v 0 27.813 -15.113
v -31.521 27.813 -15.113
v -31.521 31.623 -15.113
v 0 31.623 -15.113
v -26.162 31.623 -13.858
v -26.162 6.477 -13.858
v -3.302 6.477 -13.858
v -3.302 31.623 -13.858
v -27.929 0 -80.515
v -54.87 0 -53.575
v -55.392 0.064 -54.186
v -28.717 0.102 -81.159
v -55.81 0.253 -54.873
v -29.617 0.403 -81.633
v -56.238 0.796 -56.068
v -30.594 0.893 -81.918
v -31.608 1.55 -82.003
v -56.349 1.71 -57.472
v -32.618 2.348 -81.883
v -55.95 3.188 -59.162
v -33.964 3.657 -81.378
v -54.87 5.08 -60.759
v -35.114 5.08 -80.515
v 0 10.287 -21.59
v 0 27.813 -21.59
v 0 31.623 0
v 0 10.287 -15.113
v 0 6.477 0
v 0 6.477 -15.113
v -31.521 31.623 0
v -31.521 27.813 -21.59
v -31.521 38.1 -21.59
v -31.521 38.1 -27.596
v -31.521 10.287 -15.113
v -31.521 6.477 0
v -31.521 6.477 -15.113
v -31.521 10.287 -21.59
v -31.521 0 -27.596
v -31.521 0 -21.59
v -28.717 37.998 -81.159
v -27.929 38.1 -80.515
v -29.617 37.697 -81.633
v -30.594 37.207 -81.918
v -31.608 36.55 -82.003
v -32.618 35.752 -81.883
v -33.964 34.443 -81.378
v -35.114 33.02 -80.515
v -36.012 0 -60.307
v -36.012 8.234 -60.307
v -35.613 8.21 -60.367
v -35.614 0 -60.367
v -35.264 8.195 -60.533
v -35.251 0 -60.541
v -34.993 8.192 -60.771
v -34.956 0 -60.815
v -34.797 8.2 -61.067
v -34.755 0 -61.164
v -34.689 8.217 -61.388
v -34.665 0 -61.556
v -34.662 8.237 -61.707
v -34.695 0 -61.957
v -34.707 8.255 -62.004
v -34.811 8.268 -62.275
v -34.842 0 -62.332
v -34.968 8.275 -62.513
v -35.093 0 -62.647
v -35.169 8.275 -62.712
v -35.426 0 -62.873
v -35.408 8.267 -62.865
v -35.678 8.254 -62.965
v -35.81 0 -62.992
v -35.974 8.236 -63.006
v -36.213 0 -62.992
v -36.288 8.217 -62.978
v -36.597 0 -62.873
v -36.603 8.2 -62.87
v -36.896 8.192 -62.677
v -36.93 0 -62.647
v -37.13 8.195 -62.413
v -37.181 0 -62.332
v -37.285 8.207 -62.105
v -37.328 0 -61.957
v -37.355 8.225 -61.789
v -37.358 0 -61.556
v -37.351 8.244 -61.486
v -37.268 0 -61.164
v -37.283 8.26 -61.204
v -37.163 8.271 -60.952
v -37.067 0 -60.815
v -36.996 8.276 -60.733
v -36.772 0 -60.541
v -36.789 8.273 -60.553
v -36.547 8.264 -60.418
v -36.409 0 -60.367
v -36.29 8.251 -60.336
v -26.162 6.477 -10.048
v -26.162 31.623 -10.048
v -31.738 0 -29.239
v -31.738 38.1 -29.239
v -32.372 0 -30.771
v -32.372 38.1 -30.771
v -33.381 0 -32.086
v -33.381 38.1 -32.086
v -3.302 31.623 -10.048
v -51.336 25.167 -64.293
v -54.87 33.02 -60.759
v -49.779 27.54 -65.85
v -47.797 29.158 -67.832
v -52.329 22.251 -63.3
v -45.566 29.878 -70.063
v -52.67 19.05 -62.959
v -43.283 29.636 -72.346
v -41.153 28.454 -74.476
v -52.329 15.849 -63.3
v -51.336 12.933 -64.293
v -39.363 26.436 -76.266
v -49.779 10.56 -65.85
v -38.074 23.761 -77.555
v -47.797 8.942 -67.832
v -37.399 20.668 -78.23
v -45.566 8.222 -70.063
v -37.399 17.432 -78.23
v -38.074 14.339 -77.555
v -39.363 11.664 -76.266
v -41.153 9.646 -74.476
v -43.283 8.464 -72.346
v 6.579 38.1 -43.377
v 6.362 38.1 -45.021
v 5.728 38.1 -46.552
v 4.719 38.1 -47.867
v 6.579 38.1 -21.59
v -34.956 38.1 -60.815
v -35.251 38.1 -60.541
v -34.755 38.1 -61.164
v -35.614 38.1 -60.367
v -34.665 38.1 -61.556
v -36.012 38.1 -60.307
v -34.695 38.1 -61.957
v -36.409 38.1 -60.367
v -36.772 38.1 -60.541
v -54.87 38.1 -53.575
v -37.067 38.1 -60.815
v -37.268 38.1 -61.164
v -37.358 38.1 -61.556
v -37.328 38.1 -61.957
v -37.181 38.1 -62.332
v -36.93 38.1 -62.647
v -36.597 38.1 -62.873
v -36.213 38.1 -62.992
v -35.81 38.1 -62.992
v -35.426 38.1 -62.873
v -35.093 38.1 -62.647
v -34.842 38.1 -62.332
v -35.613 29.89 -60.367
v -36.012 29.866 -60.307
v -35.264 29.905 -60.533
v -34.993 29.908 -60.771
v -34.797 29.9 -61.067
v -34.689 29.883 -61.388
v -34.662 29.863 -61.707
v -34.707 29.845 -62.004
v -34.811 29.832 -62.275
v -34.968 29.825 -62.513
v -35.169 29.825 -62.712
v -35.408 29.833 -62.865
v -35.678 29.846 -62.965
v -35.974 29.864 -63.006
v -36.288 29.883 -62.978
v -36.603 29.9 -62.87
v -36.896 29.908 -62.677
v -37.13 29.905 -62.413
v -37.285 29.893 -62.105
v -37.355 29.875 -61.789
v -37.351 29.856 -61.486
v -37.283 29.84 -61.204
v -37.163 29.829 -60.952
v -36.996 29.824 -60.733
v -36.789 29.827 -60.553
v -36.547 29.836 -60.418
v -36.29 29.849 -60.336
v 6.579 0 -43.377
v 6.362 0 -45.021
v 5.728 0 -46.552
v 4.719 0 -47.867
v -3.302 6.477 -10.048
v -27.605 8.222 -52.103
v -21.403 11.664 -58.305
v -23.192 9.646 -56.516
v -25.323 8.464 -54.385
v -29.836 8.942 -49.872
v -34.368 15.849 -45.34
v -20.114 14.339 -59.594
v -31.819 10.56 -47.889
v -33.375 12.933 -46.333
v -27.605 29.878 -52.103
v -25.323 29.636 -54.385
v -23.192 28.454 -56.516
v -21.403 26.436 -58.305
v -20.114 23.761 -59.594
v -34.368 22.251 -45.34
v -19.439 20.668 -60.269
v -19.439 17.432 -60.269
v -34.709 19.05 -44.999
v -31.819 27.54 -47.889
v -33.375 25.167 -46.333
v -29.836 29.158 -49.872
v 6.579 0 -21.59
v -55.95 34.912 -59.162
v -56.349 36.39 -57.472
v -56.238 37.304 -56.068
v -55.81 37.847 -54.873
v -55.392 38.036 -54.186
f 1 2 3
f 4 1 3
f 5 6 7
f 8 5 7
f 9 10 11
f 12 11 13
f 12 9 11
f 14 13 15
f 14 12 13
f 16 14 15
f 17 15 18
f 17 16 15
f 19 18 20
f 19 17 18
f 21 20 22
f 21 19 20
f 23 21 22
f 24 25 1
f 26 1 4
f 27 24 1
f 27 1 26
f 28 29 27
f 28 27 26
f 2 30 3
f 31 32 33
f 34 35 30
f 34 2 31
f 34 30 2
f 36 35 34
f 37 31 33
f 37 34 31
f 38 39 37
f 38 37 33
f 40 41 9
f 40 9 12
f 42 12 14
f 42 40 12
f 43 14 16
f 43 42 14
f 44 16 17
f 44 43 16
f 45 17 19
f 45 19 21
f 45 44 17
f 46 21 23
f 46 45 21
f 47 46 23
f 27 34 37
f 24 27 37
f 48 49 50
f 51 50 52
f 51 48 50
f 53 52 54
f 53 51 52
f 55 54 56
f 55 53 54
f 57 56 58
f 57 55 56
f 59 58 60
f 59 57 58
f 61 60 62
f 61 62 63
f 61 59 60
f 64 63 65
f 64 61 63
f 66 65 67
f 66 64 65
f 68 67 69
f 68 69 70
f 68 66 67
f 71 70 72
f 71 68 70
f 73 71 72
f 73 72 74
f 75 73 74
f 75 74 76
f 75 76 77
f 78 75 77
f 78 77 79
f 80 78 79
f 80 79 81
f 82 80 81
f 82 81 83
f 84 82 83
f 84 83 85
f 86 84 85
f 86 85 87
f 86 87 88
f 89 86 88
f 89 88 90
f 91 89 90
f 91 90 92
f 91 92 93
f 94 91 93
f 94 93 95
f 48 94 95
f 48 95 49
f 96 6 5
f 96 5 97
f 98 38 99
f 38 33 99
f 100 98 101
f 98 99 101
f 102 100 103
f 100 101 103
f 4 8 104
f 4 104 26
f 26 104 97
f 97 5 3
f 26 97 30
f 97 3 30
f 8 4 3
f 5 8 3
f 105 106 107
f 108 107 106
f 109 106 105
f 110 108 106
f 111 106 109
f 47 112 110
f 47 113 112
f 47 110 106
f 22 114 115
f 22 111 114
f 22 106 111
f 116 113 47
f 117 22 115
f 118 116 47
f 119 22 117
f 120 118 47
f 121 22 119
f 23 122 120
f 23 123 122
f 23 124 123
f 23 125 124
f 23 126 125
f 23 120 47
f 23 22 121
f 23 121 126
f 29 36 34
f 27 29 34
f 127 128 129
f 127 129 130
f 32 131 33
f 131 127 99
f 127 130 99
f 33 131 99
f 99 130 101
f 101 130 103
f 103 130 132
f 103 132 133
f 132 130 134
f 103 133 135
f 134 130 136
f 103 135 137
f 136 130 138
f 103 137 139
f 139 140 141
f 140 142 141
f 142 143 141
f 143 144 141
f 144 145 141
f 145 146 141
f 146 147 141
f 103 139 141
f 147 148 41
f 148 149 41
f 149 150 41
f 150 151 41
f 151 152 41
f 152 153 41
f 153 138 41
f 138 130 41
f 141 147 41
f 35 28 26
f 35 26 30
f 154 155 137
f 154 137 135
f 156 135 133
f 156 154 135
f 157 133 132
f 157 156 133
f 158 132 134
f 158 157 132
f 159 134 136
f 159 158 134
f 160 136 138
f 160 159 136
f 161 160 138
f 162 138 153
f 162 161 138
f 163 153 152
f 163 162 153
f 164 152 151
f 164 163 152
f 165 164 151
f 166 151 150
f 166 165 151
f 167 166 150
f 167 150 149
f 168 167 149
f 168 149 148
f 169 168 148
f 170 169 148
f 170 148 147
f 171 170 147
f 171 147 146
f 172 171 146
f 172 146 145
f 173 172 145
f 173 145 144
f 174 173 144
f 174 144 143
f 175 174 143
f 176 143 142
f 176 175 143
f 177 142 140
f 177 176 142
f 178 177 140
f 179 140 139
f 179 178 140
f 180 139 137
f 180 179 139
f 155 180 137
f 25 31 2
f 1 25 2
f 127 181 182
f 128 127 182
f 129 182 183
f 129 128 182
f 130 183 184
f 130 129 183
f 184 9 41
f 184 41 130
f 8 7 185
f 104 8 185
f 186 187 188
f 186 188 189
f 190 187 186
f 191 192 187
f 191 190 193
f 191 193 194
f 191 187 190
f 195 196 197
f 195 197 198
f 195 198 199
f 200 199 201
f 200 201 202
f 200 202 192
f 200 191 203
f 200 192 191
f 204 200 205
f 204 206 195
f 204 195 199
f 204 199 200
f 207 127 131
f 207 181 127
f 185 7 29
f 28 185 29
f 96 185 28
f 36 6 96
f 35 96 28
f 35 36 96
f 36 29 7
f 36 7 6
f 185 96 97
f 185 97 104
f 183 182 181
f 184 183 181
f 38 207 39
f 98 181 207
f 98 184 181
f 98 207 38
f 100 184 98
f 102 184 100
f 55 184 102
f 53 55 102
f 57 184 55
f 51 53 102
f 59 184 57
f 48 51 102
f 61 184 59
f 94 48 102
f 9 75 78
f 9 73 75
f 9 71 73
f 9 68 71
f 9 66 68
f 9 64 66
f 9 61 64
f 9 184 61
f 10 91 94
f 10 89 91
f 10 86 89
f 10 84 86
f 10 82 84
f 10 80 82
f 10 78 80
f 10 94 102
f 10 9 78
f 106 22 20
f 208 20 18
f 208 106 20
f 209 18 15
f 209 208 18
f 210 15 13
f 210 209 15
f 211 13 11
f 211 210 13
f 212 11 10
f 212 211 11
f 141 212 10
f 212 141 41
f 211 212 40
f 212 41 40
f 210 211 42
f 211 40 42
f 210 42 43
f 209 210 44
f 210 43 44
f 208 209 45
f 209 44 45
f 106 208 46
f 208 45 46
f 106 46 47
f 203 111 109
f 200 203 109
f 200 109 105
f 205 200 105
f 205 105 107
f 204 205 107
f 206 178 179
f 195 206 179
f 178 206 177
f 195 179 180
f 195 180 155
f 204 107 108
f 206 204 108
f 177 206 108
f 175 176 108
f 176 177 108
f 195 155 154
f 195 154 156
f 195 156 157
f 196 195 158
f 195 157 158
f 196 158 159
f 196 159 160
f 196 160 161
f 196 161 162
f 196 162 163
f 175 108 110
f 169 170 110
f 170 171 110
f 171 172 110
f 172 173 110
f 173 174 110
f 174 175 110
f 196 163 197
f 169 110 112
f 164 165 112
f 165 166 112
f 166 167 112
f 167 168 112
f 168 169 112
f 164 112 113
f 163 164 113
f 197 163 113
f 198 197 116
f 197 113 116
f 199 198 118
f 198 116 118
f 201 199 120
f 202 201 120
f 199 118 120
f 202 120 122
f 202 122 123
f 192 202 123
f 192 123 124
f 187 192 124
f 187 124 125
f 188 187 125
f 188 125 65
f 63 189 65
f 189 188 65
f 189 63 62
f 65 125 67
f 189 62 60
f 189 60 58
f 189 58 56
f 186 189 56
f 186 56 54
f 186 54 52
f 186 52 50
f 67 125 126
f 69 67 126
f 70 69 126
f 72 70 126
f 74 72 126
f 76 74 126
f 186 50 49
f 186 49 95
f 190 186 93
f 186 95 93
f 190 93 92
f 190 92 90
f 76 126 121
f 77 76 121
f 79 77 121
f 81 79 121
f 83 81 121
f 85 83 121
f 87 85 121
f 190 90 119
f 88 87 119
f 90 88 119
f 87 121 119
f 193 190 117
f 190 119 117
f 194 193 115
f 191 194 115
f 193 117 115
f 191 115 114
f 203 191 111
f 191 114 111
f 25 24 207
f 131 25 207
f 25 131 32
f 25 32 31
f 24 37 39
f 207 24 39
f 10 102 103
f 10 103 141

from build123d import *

# Parameters (mm, degrees)
BOSS_EXTRUDE1_DEPTH     = 38.1
SKETCH3_W               = 15.113
SKETCH3_H               = 6.477
CUT_EXTRUDE3_DEPTH      = 100.886424174
SKETCH4_W               = 22.86
SKETCH4_H               = 3.81
CUT_EXTRUDE4_DEPTH      = 108.200359108
SKETCH5_R               = 10.8585
CUT_EXTRUDE5_DEPTH      = 25.4
FILLET1_R               = 6.35
CUT_EXTRUDE6_DEPTH      = 110.286380048
CUT_EXTRUDE6_DEPTH_BACK = 110.286380048
SKETCH6_R               = 1.349999967
FILLET2_R               = 5.08


with BuildPart() as part:
    # Sketch1 → Boss-Extrude1 (new body)
    with BuildSketch(Plane(origin=(0, 0, 0), x_dir=(1, 0, 0), z_dir=(0, 1, 0))):
        Polygon((0, 0), (-31.5214, 0), (-31.5214, 30.226), (-58.462168363, 57.166768363), (-31.5214, 84.107536726), (6.5786, 46.007536726), (6.5786, 21.59), (0, 21.59), align=None)
    extrude(amount=BOSS_EXTRUDE1_DEPTH)

    # Sketch3 → Cut-Extrude3 (cut, through all)
    with BuildSketch(Plane.ZY.offset(31.5214)):
        Polygon((-15.113, 27.813), (-15.113, 31.623), (-15.113, 38.1), (-21.59, 38.1), (-21.59, 27.813), align=None)
        with Locations((-7.5565, 34.8615)):
            Rectangle(SKETCH3_W, SKETCH3_H)
        Polygon((-21.59, 10.287), (-21.59, 0), (-15.113, 0), (-15.113, 6.477), (-15.113, 10.287), align=None)
        with Locations((-7.5565, 3.2385)):
            Rectangle(SKETCH3_W, SKETCH3_H)
    extrude(amount=-CUT_EXTRUDE3_DEPTH, mode=Mode.SUBTRACT)

    # Sketch4 → Cut-Extrude4 (cut, through all)
    with BuildSketch(Plane.XZ.offset(-6.477)):
        with Locations((-14.732, -11.95324)):
            Rectangle(SKETCH4_W, SKETCH4_H)
    extrude(amount=-CUT_EXTRUDE4_DEPTH, mode=Mode.SUBTRACT)

    # Sketch5 → Cut-Extrude5 (cut)
    with BuildSketch(Plane(origin=(-57.814468363, 0, -57.814468363), x_dir=(-0.7071067811865489, 0, 0.7071067811865462), z_dir=(-0.7071067811865462, 0, -0.7071067811865489))):
        with Locations((-18.134013876, 19.05)):
            Circle(SKETCH5_R)
    extrude(amount=-CUT_EXTRUDE5_DEPTH, mode=Mode.SUBTRACT)

    # Fillet1
    fillet1_edges = [part.edges().sort_by_distance(p)[0] for p in [
        (-31.5214, 19.05, -30.226),
        (6.5786, 19.05, -46.007536726),
    ]]
    fillet(fillet1_edges, radius=FILLET1_R)

    # Sketch6 → Cut-Extrude6 (cut, two sides: drawn at the far end of the back side and taken through both)
    with BuildSketch(Plane(origin=(0, 38.1, 0), x_dir=(1, 0, 0), z_dir=(0, 1, 0)).offset(-CUT_EXTRUDE6_DEPTH_BACK)):
        with Locations(Location((-36.011528061, 61.656896424, 0), (0, 0, 270))):
            Circle(SKETCH6_R)
    extrude(amount=CUT_EXTRUDE6_DEPTH + CUT_EXTRUDE6_DEPTH_BACK, mode=Mode.SUBTRACT)

    # Fillet2
    fillet2_edges = [part.edges().sort_by_distance(p)[0] for p in [
        (-58.462168363, 19.05, -57.166768363),
        (-31.5214, 19.05, -84.107536726),
        (-44.991784182, 38.1, -70.637152545),
        (-44.991784182, 0, -70.637152545),
    ]]
    fillet(fillet2_edges, radius=FILLET2_R)


solid = part.part
